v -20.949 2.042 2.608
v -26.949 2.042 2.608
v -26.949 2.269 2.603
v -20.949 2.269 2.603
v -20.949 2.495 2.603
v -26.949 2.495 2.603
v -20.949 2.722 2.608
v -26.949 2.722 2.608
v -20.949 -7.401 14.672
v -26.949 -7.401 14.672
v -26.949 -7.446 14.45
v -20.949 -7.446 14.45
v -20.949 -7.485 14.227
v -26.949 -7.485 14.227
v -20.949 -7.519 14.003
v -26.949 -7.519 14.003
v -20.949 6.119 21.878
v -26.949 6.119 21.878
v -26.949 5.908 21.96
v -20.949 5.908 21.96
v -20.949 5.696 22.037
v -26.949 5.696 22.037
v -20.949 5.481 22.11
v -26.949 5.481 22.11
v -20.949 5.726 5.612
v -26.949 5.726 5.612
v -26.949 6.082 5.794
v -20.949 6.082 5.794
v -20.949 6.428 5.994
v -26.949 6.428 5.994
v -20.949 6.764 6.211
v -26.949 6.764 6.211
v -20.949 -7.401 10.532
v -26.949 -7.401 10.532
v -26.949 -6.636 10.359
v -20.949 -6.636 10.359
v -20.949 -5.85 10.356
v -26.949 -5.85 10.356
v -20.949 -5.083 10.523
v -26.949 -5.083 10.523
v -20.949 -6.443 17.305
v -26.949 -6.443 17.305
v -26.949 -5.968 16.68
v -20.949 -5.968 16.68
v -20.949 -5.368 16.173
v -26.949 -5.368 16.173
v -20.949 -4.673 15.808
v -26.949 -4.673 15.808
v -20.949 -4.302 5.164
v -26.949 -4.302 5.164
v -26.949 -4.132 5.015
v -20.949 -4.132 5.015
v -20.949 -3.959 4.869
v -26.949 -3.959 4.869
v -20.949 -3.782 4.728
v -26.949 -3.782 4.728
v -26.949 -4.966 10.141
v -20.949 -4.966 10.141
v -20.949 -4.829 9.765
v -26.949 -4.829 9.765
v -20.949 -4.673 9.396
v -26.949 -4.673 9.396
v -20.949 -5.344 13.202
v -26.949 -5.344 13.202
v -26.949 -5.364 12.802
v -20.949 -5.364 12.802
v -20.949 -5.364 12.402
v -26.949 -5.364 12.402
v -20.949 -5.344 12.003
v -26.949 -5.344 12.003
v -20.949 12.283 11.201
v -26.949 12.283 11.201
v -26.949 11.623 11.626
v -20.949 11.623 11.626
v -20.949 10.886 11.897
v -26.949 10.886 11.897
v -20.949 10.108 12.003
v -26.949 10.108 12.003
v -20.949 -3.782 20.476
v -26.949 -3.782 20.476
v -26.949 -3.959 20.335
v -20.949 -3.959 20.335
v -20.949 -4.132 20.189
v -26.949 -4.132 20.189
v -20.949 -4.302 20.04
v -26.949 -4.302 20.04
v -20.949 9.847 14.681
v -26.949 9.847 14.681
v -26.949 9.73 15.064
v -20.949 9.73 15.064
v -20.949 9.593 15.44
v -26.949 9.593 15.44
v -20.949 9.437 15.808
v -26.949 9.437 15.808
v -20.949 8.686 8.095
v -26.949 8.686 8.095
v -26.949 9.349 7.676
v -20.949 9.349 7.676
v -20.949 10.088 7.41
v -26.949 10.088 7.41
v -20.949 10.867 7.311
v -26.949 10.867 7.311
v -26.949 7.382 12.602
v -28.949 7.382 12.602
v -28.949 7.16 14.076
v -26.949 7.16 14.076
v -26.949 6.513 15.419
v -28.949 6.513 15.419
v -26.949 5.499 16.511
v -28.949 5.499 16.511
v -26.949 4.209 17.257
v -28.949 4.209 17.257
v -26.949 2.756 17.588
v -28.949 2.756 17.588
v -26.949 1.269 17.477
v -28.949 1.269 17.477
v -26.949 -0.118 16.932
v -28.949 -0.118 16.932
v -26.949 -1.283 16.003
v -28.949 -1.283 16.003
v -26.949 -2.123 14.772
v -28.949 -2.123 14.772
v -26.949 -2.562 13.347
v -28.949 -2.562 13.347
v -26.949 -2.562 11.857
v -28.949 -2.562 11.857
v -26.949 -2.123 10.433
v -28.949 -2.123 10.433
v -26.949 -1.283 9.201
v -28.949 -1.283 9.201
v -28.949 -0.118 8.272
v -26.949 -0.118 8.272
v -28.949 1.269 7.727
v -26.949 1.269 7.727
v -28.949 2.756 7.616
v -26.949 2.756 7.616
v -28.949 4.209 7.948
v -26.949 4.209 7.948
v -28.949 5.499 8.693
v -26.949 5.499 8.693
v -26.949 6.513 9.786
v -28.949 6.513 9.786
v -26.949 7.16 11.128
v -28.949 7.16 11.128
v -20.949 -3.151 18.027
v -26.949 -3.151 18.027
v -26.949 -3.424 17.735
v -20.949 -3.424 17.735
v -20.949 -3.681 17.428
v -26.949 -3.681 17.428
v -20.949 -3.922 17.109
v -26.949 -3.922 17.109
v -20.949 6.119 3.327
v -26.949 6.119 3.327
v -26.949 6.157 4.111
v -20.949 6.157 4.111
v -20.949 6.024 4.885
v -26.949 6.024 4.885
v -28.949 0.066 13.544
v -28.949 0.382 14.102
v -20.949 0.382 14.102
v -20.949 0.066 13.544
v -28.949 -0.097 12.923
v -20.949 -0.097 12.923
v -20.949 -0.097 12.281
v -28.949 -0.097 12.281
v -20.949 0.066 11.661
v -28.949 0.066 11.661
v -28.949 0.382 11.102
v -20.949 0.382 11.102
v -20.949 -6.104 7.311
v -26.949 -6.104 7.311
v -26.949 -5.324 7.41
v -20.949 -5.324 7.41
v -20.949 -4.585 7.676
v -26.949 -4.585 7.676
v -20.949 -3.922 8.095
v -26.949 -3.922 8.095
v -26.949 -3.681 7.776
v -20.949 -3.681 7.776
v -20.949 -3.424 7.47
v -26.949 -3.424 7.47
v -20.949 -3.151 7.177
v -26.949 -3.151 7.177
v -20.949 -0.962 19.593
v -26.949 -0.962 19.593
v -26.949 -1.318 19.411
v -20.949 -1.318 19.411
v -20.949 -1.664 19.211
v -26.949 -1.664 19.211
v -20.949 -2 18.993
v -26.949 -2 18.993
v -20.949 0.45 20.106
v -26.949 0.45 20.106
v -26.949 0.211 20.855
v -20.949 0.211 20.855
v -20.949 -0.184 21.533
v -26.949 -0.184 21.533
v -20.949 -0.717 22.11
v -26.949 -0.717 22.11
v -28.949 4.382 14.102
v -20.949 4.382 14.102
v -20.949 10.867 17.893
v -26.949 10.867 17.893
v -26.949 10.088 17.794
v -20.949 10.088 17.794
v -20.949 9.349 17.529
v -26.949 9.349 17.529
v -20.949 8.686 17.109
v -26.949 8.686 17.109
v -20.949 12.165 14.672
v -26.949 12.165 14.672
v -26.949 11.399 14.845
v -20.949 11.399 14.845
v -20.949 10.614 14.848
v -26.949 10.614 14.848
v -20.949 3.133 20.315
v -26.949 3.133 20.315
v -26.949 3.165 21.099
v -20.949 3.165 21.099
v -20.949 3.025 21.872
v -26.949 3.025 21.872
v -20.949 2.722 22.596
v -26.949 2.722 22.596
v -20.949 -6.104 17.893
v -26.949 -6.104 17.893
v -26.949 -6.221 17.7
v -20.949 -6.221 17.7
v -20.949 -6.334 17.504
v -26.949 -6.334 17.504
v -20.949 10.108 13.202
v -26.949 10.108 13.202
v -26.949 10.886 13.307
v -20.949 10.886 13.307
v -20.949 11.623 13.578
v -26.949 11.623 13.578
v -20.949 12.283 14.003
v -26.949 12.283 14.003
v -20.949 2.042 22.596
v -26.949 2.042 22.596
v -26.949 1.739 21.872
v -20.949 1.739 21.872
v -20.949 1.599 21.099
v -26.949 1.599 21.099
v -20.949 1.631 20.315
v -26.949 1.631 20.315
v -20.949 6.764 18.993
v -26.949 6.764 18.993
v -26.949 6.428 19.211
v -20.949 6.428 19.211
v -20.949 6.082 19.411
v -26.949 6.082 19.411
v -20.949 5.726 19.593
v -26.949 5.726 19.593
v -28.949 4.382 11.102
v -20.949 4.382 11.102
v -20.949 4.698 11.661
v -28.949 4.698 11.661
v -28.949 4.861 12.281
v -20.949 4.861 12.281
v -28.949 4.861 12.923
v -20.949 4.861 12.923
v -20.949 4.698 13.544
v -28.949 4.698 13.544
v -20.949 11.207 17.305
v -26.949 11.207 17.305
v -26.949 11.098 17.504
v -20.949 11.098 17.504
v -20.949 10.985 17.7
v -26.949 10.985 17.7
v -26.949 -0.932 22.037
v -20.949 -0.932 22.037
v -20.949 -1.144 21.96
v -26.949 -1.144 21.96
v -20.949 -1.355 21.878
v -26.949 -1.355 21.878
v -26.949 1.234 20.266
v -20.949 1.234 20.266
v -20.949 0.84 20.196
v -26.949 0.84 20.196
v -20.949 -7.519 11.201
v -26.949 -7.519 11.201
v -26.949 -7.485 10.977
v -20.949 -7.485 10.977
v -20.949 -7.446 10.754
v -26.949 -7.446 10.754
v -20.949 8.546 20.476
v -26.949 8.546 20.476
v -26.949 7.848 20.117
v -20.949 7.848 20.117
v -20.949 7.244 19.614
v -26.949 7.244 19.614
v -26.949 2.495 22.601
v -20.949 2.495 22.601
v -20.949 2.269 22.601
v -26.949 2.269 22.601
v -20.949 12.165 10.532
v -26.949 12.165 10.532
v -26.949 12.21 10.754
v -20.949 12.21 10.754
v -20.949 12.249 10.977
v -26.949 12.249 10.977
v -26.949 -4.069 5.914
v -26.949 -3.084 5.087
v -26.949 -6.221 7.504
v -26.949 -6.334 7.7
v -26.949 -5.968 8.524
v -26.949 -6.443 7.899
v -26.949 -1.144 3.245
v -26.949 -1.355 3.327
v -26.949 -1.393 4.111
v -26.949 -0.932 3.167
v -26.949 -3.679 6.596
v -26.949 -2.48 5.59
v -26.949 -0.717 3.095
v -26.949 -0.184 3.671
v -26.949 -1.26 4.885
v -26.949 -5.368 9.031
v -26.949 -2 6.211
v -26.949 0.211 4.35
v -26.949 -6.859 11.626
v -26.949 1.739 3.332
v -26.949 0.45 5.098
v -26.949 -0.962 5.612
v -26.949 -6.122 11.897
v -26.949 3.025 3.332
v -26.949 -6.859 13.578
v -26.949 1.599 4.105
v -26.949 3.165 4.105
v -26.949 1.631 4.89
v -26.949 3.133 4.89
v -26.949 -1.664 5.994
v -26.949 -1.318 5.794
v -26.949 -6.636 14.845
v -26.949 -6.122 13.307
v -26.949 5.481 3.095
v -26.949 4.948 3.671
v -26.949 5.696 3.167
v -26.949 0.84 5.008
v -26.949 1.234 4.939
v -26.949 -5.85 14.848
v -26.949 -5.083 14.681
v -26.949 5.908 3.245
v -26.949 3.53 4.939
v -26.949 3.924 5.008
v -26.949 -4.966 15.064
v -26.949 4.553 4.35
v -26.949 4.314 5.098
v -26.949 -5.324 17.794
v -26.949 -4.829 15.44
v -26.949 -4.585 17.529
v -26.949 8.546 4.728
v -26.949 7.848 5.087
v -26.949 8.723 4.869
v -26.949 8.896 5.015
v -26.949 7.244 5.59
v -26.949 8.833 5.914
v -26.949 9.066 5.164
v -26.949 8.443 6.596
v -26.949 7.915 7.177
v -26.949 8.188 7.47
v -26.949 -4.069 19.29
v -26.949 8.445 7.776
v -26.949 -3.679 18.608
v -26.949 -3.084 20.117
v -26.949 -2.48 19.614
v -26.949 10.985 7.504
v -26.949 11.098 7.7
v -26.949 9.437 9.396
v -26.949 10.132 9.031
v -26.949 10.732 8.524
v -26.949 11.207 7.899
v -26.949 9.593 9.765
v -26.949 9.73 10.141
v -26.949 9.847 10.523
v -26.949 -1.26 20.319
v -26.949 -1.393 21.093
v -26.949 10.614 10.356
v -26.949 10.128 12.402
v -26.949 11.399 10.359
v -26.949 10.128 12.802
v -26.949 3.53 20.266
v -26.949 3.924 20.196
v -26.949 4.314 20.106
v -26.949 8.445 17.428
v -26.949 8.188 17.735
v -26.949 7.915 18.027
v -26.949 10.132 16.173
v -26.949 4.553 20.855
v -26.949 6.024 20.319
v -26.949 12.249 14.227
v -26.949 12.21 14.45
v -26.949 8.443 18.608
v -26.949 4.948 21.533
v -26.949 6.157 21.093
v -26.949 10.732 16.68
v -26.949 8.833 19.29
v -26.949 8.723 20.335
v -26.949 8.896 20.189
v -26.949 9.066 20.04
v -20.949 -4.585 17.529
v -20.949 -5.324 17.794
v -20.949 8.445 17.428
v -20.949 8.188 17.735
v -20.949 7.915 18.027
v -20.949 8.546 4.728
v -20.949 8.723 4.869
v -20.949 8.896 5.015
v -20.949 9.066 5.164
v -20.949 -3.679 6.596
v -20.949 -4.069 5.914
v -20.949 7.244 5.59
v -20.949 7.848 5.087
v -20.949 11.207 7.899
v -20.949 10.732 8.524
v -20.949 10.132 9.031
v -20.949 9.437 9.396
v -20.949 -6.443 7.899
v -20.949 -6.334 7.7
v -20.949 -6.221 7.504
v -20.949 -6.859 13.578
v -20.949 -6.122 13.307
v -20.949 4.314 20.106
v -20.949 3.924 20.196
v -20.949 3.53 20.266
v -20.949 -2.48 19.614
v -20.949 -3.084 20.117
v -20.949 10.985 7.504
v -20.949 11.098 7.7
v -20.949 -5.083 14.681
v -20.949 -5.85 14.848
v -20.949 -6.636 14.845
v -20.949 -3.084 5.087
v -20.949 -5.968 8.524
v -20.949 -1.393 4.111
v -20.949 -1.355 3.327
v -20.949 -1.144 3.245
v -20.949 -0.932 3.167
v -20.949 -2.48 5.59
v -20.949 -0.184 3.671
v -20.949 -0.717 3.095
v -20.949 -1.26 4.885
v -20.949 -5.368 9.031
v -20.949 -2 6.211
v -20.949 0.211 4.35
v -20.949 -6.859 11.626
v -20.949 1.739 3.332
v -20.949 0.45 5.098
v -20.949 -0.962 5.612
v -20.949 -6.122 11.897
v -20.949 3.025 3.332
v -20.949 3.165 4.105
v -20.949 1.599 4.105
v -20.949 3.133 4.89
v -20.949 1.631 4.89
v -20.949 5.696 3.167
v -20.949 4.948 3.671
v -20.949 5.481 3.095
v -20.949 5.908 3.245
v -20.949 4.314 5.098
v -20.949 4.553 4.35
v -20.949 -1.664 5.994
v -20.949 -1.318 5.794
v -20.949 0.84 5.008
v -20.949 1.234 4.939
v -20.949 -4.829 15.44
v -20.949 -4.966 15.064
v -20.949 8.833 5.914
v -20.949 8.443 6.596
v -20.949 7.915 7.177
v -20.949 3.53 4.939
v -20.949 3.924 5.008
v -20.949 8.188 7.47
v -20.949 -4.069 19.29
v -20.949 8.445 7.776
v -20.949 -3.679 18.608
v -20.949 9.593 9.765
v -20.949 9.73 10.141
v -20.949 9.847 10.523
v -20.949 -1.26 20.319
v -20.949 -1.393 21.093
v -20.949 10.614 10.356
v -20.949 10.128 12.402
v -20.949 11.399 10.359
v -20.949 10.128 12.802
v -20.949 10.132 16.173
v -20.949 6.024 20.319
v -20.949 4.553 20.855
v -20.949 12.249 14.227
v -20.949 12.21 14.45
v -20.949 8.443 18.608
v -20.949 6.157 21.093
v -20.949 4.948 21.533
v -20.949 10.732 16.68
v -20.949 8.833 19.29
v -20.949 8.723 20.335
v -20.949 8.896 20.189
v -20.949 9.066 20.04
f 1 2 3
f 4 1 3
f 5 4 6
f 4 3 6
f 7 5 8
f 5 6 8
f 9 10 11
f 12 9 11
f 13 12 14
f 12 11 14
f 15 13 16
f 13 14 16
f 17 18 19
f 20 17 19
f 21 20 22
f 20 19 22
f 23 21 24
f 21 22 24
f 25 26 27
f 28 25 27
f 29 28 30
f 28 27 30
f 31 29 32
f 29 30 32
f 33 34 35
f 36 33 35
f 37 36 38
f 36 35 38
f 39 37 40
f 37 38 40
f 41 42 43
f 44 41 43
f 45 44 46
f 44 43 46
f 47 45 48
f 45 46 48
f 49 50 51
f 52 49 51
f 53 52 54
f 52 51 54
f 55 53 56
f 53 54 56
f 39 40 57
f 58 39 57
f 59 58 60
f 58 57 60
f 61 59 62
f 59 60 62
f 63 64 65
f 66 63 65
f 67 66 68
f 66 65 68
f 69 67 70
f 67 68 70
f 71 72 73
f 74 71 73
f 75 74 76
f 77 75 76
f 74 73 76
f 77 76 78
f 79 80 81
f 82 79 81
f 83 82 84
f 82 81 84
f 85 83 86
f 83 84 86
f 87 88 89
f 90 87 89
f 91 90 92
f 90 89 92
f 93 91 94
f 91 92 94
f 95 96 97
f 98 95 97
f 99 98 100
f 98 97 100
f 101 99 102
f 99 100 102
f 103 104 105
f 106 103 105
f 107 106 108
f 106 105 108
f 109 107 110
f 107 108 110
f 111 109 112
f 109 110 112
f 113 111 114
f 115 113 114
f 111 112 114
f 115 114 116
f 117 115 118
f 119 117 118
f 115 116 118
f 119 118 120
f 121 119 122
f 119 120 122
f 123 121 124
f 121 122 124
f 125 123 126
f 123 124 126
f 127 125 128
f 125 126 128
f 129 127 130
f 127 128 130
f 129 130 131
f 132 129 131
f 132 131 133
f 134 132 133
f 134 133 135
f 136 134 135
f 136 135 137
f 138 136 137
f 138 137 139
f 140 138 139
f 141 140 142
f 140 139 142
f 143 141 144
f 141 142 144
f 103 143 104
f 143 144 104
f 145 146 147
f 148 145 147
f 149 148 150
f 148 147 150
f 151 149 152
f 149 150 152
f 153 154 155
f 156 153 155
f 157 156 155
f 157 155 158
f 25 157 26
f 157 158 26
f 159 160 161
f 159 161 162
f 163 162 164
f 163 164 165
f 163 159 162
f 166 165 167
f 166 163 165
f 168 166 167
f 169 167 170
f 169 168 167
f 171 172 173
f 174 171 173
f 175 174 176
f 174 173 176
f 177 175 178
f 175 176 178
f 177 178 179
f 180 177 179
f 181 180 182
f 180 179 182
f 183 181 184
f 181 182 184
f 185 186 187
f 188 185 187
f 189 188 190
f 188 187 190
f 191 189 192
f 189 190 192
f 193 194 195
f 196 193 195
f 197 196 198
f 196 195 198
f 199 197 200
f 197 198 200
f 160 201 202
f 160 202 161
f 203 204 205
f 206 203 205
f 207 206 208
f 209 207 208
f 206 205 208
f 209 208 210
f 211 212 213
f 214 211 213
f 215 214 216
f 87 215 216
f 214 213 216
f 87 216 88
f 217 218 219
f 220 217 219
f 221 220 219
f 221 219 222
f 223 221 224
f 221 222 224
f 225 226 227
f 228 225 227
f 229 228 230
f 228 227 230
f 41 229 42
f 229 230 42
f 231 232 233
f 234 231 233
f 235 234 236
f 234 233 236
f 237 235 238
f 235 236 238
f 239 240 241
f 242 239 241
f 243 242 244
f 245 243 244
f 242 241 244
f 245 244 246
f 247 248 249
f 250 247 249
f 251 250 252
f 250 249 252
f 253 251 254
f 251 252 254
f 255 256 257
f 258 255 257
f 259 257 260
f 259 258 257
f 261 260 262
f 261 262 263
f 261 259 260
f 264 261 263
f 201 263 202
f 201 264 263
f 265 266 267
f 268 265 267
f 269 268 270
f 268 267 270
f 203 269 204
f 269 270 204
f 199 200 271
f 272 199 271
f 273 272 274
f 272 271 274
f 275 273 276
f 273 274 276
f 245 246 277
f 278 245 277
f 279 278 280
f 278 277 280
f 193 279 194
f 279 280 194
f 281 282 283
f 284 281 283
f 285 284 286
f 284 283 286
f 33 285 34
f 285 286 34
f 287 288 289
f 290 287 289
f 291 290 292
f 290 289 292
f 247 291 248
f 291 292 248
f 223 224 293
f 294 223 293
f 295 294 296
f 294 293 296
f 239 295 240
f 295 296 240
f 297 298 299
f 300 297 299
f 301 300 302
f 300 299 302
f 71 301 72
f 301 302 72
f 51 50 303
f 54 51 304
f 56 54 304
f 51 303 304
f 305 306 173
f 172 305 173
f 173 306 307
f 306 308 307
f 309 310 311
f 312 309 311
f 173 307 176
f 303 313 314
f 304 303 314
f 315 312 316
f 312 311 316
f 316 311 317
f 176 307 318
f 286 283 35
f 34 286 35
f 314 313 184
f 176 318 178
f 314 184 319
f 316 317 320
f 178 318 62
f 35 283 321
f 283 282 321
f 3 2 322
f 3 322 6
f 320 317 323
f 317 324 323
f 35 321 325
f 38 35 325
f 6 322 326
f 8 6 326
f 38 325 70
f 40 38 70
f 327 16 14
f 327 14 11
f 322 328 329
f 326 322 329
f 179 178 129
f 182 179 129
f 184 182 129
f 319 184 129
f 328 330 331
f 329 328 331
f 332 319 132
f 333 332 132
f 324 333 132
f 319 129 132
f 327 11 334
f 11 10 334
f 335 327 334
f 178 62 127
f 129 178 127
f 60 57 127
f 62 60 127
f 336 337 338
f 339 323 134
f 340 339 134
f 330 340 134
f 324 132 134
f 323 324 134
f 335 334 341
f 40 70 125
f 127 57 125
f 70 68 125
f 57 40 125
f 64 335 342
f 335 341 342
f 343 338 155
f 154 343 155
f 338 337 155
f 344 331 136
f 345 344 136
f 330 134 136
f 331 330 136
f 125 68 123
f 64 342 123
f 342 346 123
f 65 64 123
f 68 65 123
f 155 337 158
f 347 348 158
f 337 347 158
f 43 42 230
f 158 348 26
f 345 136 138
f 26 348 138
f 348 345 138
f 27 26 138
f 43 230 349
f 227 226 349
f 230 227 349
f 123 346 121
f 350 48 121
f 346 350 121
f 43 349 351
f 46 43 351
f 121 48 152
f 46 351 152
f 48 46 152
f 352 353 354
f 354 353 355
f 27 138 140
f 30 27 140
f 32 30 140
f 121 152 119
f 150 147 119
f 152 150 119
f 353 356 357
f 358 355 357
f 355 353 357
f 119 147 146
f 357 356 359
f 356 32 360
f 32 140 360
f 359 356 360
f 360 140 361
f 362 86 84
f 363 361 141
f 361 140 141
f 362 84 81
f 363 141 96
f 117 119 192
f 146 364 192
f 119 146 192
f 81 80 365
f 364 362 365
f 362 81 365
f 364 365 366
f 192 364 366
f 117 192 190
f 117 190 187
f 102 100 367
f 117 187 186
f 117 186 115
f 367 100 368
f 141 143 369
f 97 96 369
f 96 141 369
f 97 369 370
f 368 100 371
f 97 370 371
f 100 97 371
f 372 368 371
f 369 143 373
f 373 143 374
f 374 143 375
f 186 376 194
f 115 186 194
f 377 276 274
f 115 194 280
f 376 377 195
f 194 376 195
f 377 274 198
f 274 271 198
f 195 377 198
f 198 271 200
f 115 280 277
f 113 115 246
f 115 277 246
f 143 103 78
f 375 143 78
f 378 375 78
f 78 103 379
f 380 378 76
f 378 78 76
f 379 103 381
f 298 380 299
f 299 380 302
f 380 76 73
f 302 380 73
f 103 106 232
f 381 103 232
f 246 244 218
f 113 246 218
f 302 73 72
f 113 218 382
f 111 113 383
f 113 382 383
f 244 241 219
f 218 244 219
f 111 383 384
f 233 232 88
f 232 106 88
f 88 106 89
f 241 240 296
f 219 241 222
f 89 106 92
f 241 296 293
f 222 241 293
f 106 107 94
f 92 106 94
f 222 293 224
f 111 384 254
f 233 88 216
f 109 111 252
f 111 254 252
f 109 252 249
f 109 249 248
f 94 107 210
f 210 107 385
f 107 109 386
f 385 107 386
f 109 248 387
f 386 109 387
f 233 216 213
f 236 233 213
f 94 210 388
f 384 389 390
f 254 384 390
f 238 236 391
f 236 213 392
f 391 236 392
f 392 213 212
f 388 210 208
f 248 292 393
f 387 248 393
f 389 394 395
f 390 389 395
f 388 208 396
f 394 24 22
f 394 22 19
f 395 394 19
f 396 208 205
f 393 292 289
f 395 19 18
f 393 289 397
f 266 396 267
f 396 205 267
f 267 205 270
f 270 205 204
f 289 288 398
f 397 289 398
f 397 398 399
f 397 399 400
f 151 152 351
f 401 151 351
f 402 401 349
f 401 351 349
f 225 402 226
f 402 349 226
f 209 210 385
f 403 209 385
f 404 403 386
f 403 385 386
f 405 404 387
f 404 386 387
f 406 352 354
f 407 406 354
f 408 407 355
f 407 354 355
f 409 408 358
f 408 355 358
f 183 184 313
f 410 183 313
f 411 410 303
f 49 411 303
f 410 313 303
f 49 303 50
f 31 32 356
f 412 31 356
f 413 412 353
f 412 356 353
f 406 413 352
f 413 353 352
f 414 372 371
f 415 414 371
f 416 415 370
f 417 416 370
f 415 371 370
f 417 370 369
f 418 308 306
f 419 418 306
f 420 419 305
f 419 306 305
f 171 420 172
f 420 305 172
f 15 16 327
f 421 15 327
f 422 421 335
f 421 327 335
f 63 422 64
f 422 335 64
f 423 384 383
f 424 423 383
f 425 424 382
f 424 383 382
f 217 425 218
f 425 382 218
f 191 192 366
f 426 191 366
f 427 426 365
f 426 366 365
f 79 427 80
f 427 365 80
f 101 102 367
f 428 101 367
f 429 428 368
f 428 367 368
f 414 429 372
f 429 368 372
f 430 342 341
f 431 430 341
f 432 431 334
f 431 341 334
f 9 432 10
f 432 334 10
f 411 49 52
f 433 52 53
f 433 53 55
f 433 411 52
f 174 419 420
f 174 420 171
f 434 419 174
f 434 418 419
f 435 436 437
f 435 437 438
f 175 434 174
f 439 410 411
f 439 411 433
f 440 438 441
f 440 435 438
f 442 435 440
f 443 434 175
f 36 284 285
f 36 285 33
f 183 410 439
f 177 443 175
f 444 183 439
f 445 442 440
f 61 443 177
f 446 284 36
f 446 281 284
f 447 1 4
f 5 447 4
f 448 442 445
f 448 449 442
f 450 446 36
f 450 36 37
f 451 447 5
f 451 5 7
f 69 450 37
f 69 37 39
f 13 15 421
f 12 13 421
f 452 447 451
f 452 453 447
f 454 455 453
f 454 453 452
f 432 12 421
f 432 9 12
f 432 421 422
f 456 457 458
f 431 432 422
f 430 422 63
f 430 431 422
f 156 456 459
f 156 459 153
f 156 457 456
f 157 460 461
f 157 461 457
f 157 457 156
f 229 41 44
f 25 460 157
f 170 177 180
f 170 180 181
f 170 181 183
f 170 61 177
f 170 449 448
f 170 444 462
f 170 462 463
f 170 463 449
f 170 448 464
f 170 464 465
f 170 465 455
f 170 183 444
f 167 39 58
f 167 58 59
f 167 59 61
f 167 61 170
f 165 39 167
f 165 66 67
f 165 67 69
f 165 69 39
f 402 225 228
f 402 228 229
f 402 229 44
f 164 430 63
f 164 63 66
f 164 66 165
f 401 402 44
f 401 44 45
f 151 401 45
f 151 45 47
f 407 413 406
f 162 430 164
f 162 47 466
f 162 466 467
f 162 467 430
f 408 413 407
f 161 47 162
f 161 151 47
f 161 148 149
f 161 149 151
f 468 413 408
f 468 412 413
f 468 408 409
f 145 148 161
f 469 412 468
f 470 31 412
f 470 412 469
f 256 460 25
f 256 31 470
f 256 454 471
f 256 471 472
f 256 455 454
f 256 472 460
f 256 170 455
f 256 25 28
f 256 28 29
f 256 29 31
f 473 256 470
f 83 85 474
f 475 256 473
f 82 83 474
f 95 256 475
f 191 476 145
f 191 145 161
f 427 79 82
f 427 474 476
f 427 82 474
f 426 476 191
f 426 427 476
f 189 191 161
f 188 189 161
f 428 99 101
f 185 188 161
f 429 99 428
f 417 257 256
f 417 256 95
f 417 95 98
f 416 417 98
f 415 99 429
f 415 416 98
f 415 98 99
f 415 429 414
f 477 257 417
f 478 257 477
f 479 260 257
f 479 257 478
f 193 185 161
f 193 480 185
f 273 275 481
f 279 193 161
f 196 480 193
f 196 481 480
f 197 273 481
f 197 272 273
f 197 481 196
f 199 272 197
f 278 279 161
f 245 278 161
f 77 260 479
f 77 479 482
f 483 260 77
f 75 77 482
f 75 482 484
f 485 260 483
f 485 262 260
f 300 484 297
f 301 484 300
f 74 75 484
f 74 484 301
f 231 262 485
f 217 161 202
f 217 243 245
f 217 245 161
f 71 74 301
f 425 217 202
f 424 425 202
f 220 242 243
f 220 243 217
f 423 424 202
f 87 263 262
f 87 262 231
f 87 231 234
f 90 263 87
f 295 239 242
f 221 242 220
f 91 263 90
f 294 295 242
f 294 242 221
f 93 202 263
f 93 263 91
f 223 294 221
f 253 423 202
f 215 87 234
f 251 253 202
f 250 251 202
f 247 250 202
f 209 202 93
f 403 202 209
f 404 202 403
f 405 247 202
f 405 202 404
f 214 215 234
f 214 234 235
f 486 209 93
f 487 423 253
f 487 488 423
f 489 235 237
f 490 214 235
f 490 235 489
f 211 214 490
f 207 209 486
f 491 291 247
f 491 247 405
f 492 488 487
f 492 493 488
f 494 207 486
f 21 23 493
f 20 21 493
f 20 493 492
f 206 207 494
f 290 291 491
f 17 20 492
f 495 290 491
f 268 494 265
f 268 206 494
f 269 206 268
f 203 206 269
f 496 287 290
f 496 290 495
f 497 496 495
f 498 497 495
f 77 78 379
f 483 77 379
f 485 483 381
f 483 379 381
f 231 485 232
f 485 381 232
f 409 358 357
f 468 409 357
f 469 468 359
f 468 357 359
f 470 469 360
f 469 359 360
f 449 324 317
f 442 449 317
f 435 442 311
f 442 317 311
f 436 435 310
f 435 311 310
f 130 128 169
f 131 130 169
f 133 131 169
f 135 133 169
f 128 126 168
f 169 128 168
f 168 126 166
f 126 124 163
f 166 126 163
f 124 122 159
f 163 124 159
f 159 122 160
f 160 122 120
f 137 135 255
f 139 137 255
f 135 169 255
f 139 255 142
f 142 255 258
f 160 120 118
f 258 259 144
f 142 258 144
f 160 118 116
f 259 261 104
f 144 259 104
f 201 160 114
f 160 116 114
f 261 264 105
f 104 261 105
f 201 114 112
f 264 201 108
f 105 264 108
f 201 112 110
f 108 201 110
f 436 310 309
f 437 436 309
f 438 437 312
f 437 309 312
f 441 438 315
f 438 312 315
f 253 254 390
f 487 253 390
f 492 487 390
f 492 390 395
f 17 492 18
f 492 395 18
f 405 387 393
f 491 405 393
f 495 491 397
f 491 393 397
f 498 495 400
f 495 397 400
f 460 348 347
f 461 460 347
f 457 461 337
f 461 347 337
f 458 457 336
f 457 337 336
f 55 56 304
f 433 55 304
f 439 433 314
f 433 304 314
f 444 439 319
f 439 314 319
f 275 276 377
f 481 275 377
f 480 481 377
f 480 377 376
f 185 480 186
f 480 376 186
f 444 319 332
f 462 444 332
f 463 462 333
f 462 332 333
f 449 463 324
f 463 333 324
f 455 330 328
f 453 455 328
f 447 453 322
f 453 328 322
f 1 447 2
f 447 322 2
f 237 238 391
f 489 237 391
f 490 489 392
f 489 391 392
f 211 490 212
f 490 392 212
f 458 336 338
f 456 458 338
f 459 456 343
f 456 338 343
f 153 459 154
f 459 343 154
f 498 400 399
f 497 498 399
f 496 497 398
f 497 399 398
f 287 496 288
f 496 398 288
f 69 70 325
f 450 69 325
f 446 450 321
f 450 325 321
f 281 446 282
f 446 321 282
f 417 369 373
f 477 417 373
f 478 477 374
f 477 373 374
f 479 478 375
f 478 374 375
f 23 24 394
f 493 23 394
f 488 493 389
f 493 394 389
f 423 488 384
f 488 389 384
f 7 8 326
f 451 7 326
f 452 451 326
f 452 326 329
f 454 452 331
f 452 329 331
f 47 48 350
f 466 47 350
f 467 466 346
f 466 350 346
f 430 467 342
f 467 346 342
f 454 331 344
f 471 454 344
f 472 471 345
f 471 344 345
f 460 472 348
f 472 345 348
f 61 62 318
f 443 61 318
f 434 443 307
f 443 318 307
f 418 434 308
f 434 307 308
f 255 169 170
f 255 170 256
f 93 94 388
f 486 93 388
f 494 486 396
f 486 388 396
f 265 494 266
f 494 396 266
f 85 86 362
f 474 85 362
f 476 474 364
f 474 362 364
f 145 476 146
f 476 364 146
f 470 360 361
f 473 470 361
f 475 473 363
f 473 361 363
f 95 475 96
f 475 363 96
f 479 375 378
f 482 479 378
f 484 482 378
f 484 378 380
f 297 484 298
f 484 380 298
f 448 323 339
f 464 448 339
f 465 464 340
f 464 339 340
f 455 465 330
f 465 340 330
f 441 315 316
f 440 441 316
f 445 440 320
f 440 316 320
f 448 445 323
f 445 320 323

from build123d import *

# Parameters (mm, degrees)
SPUR_START                  = -26.948632746
SPUR_GEAR_ISO_OUTLINE_R     = 2.5
SPUR_GEAR_ISO_DEPTH         = 6
SPUR_START_2                = -28.948683546
SPUR_GEAR_ISO_2_OUTLINE_R   = 5
SPUR_GEAR_ISO_2_OUTLINE_R_2 = 2.5
SPUR_GEAR_ISO_2_DEPTH       = 2.0000508
BOSS_EXTRUDE1_DEPTH         = 8.0000508


# Read off the part's stored shape, not the designer's step: spur gear_iso
with BuildPart() as part:
    # spur gear_iso outline → spur gear_iso (new body)
    with BuildSketch(Plane.YZ.offset(SPUR_START)):
        with BuildLine():
            ThreePointArc((9.06624461, 20.039929061), (8.809867644, 20.262580741), (8.54607915, 20.476399706))
            ThreePointArc((8.54607915, 20.476399706), (7.532383697, 19.882145035), (6.764050297, 18.993111362))
            ThreePointArc((6.764050297, 18.993111362), (6.256491547, 19.312967164), (5.725708923, 19.592598034))
            ThreePointArc((5.725708923, 19.592598034), (6.111467968, 20.702511114), (6.119259883, 21.877524463))
            ThreePointArc((6.119259883, 21.877524463), (5.802192981, 21.999062518), (5.481182486, 22.109765643))
            ThreePointArc((5.481182486, 22.109765643), (4.731867417, 21.20464465), (4.313937615, 20.106440768))
            ThreePointArc((4.313937615, 20.106440768), (3.727591276, 20.233411588), (3.13317937, 20.314640304))
            ThreePointArc((3.13317937, 20.314640304), (3.116061668, 21.489554798), (2.721505439, 22.596371164))
            ThreePointArc((2.721505439, 22.596371164), (2.381991548, 22.60213631), (2.042477656, 22.596371164))
            ThreePointArc((2.042477656, 22.596371164), (1.647921427, 21.489554798), (1.630803724, 20.314640304))
            ThreePointArc((1.630803724, 20.314640304), (1.036391818, 20.233411588), (0.45004548, 20.106440768))
            ThreePointArc((0.45004548, 20.106440768), (0.032115678, 21.20464465), (-0.717199391, 22.109765643))
            ThreePointArc((-0.717199391, 22.109765643), (-1.038209886, 21.999062518), (-1.355276788, 21.877524463))
            ThreePointArc((-1.355276788, 21.877524463), (-1.347484873, 20.702511114), (-0.961725828, 19.592598034))
            ThreePointArc((-0.961725828, 19.592598034), (-1.492508453, 19.312967164), (-2.000067202, 18.993111362))
            ThreePointArc((-2.000067202, 18.993111362), (-2.768400602, 19.882145035), (-3.782096055, 20.476399706))
            ThreePointArc((-3.782096055, 20.476399706), (-4.045884549, 20.262580741), (-4.302261515, 20.039929061))
            ThreePointArc((-4.302261515, 20.039929061), (-3.893061276, 18.938442679), (-3.150953717, 18.027402912))
            ThreePointArc((-3.150953717, 18.027402912), (-3.554086842, 17.583097498), (-3.921638927, 17.108936045))
            ThreePointArc((-3.921638927, 17.108936045), (-4.947703578, 17.681568927), (-6.103512782, 17.893281392))
            ThreePointArc((-6.103512782, 17.893281392), (-6.27826249, 17.60213631), (-6.443026673, 17.305226082))
            ThreePointArc((-6.443026673, 17.305226082), (-5.681773697, 16.410122182), (-4.672826749, 15.807840569))
            ThreePointArc((-4.672826749, 15.807840569), (-4.899686571, 15.252450401), (-5.082899784, 14.681174166))
            ThreePointArc((-5.082899784, 14.681174166), (-6.242937146, 14.868338281), (-7.401452454, 14.671972892))
            ThreePointArc((-7.401452454, 14.671972892), (-7.466085983, 14.338618087), (-7.519364391, 14.003261067))
            ThreePointArc((-7.519364391, 14.003261067), (-6.497877023, 13.422502389), (-5.343784577, 13.201622982))
            ThreePointArc((-5.343784577, 13.201622982), (-5.367008453, 12.60213631), (-5.343784577, 12.002649638))
            ThreePointArc((-5.343784577, 12.002649638), (-6.497877023, 11.781770232), (-7.519364391, 11.201011553))
            ThreePointArc((-7.519364391, 11.201011553), (-7.466085983, 10.865654533), (-7.401452454, 10.532299728))
            ThreePointArc((-7.401452454, 10.532299728), (-6.242937146, 10.335934339), (-5.082899784, 10.523098454))
            ThreePointArc((-5.082899784, 10.523098454), (-4.899686571, 9.951822219), (-4.672826749, 9.396432051))
            ThreePointArc((-4.672826749, 9.396432051), (-5.681773698, 8.794150439), (-6.443026673, 7.899046538))
            ThreePointArc((-6.443026673, 7.899046538), (-6.27826249, 7.60213631), (-6.103512782, 7.310991228))
            ThreePointArc((-6.103512782, 7.310991228), (-4.947703577, 7.522703693), (-3.921638927, 8.095336576))
            ThreePointArc((-3.921638927, 8.095336576), (-3.554086842, 7.621175123), (-3.150953717, 7.176869708))
            ThreePointArc((-3.150953717, 7.176869708), (-3.893061276, 6.265829942), (-4.302261515, 5.16434356))
            ThreePointArc((-4.302261515, 5.16434356), (-4.045884549, 4.941691879), (-3.782096055, 4.727872914))
            ThreePointArc((-3.782096055, 4.727872914), (-2.768400602, 5.322127585), (-2.000067202, 6.211161258))
            ThreePointArc((-2.000067202, 6.211161258), (-1.492508453, 5.891305456), (-0.961725828, 5.611674586))
            ThreePointArc((-0.961725828, 5.611674586), (-1.347484873, 4.501761506), (-1.355276788, 3.326748157))
            ThreePointArc((-1.355276788, 3.326748157), (-1.038209886, 3.205210102), (-0.717199391, 3.094506978))
            ThreePointArc((-0.717199391, 3.094506978), (0.032115678, 3.999627971), (0.45004548, 5.097831853))
            ThreePointArc((0.45004548, 5.097831853), (1.036391818, 4.970861032), (1.630803724, 4.889632316))
            ThreePointArc((1.630803724, 4.889632316), (1.647921427, 3.714717822), (2.042477656, 2.607901456))
            ThreePointArc((2.042477656, 2.607901456), (2.381991548, 2.60213631), (2.721505439, 2.607901456))
            ThreePointArc((2.721505439, 2.607901456), (3.116061668, 3.714717822), (3.13317937, 4.889632316))
            ThreePointArc((3.13317937, 4.889632316), (3.727591276, 4.970861032), (4.313937615, 5.097831853))
            ThreePointArc((4.313937615, 5.097831853), (4.731867417, 3.999627971), (5.481182486, 3.094506978))
            ThreePointArc((5.481182486, 3.094506978), (5.802192981, 3.205210102), (6.119259883, 3.326748157))
            ThreePointArc((6.119259883, 3.326748157), (6.111467968, 4.501761506), (5.725708923, 5.611674586))
            ThreePointArc((5.725708923, 5.611674586), (6.256491547, 5.891305456), (6.764050297, 6.211161258))
            ThreePointArc((6.764050297, 6.211161258), (7.532383697, 5.322127585), (8.54607915, 4.727872914))
            ThreePointArc((8.54607915, 4.727872914), (8.809867644, 4.941691879), (9.06624461, 5.16434356))
            ThreePointArc((9.06624461, 5.16434356), (8.657044371, 6.265829942), (7.914936812, 7.176869708))
            ThreePointArc((7.914936812, 7.176869708), (8.318069937, 7.621175123), (8.685622021, 8.095336576))
            ThreePointArc((8.685622021, 8.095336576), (9.711686672, 7.522703693), (10.867495877, 7.310991228))
            ThreePointArc((10.867495877, 7.310991228), (11.042245585, 7.60213631), (11.207009768, 7.899046538))
            ThreePointArc((11.207009768, 7.899046538), (10.445756793, 8.794150439), (9.436809844, 9.396432051))
            ThreePointArc((9.436809844, 9.396432051), (9.663669666, 9.951822219), (9.846882879, 10.523098454))
            ThreePointArc((9.846882879, 10.523098454), (11.006920241, 10.335934339), (12.165435549, 10.532299728))
            ThreePointArc((12.165435549, 10.532299728), (12.230069078, 10.865654533), (12.283347486, 11.201011553))
            ThreePointArc((12.283347486, 11.201011553), (11.261860118, 11.781770232), (10.107767672, 12.002649638))
            ThreePointArc((10.107767672, 12.002649638), (10.130991547, 12.60213631), (10.107767672, 13.201622982))
            ThreePointArc((10.107767672, 13.201622982), (11.261860118, 13.422502389), (12.283347486, 14.003261067))
            ThreePointArc((12.283347486, 14.003261067), (12.230069078, 14.338618087), (12.165435549, 14.671972892))
            ThreePointArc((12.165435549, 14.671972892), (11.006920241, 14.868338281), (9.846882879, 14.681174166))
            ThreePointArc((9.846882879, 14.681174166), (9.663669666, 15.252450401), (9.436809844, 15.807840569))
            ThreePointArc((9.436809844, 15.807840569), (10.445756792, 16.410122182), (11.207009768, 17.305226082))
            ThreePointArc((11.207009768, 17.305226082), (11.042245585, 17.60213631), (10.867495877, 17.893281392))
            ThreePointArc((10.867495877, 17.893281392), (9.711686672, 17.681568927), (8.685622021, 17.108936045))
            ThreePointArc((8.685622021, 17.108936045), (8.318069937, 17.583097498), (7.914936812, 18.027402912))
            ThreePointArc((7.914936812, 18.027402912), (8.657044371, 18.938442679), (9.06624461, 20.039929061))
        make_face()
        with Locations((2.381991547, 12.60213631)):
            Circle(SPUR_GEAR_ISO_OUTLINE_R, mode=Mode.SUBTRACT)
    extrude(amount=SPUR_GEAR_ISO_DEPTH)

    # spur gear_iso 2 outline → spur gear_iso 2 (add)
    with BuildSketch(Plane.YZ.offset(SPUR_START_2)):
        with Locations((2.381991547, 12.60213631)):
            Circle(SPUR_GEAR_ISO_2_OUTLINE_R)
        with Locations((2.381991547, 12.60213631)):
            Circle(SPUR_GEAR_ISO_2_OUTLINE_R_2, mode=Mode.SUBTRACT)
    extrude(amount=SPUR_GEAR_ISO_2_DEPTH)

    # Sketch1 → Boss-Extrude1 (add)
    with BuildSketch(Plane.ZY.offset(28.948683546)):
        with BuildLine():
            Line((11.10213631, 0.381991547), (11.10213631, 4.381991547))
            ThreePointArc((11.10213631, 4.381991547), (10.10213631, 2.381991547), (11.10213631, 0.381991547))
        make_face()
        with BuildLine():
            ThreePointArc((15.10213631, 2.381991547), (14.838204288, 3.500025536), (14.10213631, 4.381991547))
            Line((14.10213631, 4.381991547), (14.10213631, 0.381991547))
            ThreePointArc((14.10213631, 0.381991547), (14.838204288, 1.263957559), (15.10213631, 2.381991547))
        make_face()
    extrude(amount=-BOSS_EXTRUDE1_DEPTH)


solid = part.part
